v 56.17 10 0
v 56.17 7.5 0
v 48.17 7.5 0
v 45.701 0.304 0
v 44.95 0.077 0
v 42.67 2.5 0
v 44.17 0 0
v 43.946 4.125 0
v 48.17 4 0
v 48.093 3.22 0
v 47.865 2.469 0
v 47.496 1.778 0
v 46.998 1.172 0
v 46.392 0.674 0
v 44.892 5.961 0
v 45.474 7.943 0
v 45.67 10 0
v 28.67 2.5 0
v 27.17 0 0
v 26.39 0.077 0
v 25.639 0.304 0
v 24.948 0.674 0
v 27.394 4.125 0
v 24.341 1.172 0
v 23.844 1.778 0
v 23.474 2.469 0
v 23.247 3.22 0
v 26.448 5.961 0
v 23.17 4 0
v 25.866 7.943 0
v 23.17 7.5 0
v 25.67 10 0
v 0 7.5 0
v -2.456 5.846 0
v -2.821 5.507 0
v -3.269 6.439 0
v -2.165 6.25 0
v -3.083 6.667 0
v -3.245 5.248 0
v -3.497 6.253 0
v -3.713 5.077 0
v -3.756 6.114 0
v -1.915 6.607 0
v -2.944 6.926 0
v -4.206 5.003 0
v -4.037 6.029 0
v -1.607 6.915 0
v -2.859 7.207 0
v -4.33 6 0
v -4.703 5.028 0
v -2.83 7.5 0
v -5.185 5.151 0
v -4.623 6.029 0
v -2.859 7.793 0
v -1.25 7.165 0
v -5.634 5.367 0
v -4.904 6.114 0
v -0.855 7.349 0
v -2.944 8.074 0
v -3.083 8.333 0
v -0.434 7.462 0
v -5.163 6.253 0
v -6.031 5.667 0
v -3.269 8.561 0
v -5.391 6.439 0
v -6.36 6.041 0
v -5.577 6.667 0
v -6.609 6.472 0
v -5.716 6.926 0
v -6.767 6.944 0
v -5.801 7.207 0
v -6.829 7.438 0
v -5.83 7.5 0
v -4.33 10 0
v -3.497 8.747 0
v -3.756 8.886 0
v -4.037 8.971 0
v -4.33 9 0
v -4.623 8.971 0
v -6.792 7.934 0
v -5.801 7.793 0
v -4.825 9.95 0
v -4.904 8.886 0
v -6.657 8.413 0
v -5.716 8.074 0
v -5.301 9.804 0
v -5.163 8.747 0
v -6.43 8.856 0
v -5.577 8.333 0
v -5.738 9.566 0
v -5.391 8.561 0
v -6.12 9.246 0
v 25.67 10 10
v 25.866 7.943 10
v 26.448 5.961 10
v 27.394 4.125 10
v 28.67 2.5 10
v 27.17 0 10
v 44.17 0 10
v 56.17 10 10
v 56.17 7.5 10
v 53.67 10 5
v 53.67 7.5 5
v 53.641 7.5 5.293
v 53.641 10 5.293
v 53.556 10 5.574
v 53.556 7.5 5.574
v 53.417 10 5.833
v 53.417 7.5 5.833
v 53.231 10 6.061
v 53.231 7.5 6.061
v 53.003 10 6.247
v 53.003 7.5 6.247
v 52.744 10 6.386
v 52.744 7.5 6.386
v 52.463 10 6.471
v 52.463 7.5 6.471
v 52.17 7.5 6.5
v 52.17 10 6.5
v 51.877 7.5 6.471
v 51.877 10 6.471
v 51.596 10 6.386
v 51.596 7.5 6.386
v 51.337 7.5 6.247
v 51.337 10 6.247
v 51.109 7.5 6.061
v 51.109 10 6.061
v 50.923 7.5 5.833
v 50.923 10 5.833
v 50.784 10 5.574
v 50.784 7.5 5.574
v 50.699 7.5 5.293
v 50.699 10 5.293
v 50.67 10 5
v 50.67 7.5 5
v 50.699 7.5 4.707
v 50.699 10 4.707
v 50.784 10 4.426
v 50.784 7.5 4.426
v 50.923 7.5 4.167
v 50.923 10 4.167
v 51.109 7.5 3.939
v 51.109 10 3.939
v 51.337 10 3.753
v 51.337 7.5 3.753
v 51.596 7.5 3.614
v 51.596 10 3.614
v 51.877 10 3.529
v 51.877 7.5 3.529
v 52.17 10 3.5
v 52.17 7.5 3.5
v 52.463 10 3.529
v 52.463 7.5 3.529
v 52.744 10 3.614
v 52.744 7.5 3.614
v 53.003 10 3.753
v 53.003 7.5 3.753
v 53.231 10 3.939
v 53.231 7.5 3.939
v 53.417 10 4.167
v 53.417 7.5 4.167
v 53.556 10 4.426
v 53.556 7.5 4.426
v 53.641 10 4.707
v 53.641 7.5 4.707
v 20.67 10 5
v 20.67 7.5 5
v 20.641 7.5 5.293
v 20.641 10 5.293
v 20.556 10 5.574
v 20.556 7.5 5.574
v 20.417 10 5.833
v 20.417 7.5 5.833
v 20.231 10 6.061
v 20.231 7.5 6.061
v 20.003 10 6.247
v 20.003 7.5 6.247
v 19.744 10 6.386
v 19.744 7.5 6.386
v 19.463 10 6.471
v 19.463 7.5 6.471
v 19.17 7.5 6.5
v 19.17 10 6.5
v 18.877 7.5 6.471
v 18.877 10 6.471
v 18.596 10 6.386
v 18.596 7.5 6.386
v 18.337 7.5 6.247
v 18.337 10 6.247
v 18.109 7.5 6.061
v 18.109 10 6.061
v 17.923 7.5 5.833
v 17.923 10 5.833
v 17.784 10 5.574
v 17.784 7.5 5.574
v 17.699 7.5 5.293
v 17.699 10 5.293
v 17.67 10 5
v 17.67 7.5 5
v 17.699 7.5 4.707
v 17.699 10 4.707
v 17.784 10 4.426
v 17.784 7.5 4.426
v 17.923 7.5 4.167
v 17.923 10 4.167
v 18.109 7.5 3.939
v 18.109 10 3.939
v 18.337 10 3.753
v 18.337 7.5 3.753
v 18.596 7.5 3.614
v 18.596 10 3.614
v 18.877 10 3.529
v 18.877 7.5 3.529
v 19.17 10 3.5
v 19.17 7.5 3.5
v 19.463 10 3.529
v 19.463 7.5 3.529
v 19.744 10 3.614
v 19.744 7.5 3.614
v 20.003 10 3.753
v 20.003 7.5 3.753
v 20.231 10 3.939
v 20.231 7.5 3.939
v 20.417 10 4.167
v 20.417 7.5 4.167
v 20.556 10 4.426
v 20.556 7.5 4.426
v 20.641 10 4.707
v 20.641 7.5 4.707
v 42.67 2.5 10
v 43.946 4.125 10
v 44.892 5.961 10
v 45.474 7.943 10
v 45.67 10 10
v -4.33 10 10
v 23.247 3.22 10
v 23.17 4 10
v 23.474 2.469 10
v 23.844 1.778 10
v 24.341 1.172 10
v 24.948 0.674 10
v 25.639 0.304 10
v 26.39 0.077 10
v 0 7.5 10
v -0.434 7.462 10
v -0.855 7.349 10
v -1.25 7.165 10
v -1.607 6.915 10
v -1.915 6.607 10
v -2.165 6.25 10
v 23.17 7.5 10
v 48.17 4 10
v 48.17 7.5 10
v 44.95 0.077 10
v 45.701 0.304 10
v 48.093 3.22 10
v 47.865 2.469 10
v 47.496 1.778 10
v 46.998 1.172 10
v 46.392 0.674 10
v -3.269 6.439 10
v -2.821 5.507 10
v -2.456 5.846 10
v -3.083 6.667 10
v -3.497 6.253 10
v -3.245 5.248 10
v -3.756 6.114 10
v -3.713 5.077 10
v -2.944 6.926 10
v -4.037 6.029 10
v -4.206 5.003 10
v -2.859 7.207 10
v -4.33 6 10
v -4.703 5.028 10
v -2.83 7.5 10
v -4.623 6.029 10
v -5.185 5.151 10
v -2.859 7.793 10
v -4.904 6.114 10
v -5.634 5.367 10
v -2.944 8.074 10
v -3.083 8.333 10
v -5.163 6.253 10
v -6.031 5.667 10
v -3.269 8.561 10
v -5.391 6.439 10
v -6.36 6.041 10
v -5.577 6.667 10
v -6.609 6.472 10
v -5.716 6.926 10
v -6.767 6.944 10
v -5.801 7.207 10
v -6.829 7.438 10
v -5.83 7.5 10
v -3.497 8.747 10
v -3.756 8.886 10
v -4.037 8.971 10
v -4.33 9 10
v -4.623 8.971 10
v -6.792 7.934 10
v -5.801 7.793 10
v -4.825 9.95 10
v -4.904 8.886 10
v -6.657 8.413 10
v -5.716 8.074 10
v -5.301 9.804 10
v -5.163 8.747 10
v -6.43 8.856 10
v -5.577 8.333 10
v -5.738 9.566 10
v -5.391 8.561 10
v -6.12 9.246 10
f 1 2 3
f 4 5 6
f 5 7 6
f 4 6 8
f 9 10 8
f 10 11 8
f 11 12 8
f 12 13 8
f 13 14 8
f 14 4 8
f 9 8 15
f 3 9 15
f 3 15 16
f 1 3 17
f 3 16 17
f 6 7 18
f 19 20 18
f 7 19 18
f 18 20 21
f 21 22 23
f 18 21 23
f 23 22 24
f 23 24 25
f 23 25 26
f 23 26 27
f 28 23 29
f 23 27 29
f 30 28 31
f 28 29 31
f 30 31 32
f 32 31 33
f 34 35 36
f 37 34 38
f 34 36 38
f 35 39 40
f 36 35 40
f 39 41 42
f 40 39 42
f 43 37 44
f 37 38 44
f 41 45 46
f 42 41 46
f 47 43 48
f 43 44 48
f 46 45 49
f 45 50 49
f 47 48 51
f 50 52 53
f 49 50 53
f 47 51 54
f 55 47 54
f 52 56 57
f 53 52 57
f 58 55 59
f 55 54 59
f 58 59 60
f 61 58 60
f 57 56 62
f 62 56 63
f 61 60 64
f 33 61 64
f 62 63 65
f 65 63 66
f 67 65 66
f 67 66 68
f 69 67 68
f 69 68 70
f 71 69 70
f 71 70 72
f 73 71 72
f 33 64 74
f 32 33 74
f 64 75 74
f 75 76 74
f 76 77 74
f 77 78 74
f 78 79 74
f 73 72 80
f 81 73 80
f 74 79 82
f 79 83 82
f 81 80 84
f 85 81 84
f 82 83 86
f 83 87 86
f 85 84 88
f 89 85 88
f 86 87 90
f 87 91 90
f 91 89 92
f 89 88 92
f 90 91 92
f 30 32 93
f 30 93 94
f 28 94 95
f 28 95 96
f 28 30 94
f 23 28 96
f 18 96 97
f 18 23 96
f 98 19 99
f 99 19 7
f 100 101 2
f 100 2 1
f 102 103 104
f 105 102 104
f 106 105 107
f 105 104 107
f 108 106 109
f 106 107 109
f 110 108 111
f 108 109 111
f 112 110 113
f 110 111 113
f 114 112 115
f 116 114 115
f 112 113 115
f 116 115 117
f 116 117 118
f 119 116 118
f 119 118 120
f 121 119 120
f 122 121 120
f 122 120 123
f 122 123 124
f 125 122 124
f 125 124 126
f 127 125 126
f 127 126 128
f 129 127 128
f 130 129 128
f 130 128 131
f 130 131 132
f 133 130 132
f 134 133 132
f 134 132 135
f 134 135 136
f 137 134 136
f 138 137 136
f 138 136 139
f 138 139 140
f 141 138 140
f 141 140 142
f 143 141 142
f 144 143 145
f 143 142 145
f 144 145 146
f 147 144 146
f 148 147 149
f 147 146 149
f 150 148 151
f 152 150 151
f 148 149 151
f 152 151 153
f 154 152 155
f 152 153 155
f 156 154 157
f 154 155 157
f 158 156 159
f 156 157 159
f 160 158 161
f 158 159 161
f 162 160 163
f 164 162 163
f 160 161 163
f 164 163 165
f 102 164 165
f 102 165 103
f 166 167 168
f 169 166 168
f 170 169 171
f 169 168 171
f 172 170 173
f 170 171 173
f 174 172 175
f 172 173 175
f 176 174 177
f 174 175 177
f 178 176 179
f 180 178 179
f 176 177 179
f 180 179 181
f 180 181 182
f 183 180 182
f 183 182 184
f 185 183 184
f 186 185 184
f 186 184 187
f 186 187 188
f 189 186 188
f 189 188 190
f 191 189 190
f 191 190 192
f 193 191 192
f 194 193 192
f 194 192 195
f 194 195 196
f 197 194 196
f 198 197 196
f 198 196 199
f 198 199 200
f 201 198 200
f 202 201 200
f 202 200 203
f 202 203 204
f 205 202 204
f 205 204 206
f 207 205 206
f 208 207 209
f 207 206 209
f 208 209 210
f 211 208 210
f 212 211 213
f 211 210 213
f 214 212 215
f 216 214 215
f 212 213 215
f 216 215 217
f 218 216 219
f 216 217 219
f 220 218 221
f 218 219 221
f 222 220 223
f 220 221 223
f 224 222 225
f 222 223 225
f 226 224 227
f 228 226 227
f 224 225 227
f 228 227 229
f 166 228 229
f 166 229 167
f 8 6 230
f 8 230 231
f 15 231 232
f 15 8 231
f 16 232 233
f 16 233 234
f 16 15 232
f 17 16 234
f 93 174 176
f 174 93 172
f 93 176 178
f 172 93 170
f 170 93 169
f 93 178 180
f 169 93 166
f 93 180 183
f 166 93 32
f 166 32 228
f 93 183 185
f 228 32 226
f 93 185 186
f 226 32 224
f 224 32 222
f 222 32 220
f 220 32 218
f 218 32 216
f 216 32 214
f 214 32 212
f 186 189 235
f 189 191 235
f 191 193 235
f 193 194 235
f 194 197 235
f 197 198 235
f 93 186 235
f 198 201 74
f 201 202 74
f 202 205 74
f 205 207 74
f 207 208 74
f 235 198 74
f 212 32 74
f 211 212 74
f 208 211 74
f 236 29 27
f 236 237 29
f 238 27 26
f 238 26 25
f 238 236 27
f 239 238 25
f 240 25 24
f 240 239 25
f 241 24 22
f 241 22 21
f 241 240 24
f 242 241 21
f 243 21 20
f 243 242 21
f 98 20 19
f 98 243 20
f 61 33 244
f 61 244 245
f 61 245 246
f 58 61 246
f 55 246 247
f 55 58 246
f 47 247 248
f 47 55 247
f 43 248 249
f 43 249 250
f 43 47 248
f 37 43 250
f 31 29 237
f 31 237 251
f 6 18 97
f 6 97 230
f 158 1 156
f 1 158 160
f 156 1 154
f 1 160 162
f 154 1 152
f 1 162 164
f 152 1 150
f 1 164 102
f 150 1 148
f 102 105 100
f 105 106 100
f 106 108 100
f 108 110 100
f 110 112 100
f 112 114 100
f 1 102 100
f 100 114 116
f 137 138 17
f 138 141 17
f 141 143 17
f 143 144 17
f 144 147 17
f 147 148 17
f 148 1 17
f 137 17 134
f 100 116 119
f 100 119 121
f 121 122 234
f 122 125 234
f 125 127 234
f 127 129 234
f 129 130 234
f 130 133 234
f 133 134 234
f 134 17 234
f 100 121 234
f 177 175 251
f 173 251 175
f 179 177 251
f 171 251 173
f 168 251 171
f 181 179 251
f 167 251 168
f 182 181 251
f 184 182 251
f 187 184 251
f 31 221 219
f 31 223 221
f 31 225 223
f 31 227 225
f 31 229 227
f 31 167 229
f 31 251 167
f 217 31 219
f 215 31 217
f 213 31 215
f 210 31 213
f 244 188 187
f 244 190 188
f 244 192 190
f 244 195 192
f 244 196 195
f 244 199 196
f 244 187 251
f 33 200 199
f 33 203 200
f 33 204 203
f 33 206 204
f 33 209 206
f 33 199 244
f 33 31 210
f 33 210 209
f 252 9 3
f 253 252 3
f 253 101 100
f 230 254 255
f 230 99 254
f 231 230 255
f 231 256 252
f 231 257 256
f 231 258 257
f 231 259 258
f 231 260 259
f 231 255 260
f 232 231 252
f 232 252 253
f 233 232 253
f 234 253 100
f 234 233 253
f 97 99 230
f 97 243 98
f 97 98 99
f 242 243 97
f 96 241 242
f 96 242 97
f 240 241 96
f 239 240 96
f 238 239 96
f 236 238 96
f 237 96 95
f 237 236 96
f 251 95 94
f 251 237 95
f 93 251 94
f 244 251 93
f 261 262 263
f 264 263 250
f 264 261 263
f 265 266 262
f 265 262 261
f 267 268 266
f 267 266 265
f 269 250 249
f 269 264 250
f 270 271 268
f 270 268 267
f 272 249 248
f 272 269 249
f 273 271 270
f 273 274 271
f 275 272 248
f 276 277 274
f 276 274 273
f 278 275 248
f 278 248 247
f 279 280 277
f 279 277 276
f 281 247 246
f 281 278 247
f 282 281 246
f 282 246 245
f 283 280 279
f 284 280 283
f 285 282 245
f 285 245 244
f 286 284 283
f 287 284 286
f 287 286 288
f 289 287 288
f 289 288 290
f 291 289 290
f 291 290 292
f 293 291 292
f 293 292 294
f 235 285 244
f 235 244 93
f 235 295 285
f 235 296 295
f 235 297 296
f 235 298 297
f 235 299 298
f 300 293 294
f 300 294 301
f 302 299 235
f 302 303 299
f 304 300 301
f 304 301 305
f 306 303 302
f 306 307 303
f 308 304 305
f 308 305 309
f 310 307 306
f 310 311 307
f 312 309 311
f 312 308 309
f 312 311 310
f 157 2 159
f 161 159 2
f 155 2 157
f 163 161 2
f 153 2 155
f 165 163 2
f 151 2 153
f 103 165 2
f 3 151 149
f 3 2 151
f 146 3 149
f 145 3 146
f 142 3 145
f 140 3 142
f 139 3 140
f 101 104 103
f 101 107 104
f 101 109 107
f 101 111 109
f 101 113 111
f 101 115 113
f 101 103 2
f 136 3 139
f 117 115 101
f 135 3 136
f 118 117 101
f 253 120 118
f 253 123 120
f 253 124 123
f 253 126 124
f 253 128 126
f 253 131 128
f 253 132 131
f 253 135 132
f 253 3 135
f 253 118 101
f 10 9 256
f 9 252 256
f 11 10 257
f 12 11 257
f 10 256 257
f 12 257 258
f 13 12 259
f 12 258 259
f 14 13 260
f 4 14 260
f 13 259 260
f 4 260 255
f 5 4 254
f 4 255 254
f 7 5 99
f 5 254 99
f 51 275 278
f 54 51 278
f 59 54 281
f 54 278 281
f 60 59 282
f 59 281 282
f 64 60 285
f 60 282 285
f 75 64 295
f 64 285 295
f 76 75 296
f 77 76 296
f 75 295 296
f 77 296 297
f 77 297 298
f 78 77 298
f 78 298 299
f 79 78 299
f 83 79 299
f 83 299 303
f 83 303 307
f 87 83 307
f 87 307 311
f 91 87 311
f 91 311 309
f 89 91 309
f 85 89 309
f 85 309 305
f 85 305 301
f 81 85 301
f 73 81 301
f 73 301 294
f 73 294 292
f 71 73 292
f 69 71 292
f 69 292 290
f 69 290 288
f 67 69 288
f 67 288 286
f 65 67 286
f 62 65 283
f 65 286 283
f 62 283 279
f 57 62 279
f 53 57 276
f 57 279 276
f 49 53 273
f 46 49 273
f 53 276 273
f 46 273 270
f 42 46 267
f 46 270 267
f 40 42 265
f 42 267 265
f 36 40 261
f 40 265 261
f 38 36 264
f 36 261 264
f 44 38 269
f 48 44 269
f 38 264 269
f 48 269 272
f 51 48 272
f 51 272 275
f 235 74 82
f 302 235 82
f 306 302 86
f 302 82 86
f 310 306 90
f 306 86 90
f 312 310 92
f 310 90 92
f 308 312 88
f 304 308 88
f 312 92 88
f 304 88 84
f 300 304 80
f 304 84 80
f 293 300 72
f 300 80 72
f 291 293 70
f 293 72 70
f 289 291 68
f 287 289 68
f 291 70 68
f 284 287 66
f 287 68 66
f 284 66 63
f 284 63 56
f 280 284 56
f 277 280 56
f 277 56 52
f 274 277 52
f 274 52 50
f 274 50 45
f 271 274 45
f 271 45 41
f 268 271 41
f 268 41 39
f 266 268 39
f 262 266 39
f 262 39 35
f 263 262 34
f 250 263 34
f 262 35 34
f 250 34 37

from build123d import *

# Parameters (mm, degrees)
PAD_DEPTH       = 10
SKETCH002_R     = 1.5
POCKET_DEPTH    = 10.001
SKETCH003_W     = 2.5
SKETCH003_H     = 10
PAD001_DEPTH    = 8
SKETCH004_R     = 1.5
POCKET001_DEPTH = 2.501
FILLET_R        = 4


with BuildPart() as part:
    # Sketch → Pad (new body)
    with BuildSketch(Plane.XY):
        with BuildLine():
            ThreePointArc((25.669873, 10), (26.447689, 5.961126), (28.669873, 2.5))
            Line((28.669873, 2.5), (42.669873, 2.5))
            ThreePointArc((42.669873, 2.5), (44.892057, 5.961126), (45.669873, 10))
            Line((48.169873, 10), (45.669873, 10))
            Line((48.169873, 0), (48.169873, 10))
            Line((23.169873, 0), (48.169873, 0))
            Line((23.169873, 0), (23.169873, 7.5))
            Line((23.169873, 7.5), (0, 7.5))
            ThreePointArc((0, 7.5), (-1.25, 7.165064), (-2.165064, 6.25))
            ThreePointArc((-4.330127, 10), (-6.495191, 6.25), (-2.165064, 6.25))
            Line((-4.330127, 10), (23.169873, 10))
            Line((25.669873, 10), (23.169873, 10))
        make_face()
    extrude(amount=PAD_DEPTH)

    # Sketch002 → Pocket (cut, through all)
    with BuildSketch(Plane.XY.offset(10)):
        with Locations((-4.330127, 7.5)):
            Circle(SKETCH002_R)
    extrude(amount=-POCKET_DEPTH, mode=Mode.SUBTRACT)

    # Sketch003 (on Face11 of Pocket) → Pad001 (join)
    with BuildSketch(Plane.YZ.offset(48.169873)):
        with Locations((8.75, 5)):
            Rectangle(SKETCH003_W, SKETCH003_H)
    extrude(amount=PAD001_DEPTH)

    # Sketch004 (on Face11 of Pad001) → Pocket001 (cut, through all)
    with BuildSketch(Plane.XZ.offset(-7.5)):
        with Locations((52.169873, 5)):
            Circle(SKETCH004_R)
        with Locations((19.169873, 5)):
            Circle(SKETCH004_R)
    extrude(amount=-POCKET001_DEPTH, mode=Mode.SUBTRACT)

    # Fillet
    fillet_edges = [part.edges().sort_by_distance(p)[0] for p in [
        (48.169873, 0, 5),
        (23.169873, 0, 5),
    ]]
    fillet(fillet_edges, radius=FILLET_R)


solid = part.part
